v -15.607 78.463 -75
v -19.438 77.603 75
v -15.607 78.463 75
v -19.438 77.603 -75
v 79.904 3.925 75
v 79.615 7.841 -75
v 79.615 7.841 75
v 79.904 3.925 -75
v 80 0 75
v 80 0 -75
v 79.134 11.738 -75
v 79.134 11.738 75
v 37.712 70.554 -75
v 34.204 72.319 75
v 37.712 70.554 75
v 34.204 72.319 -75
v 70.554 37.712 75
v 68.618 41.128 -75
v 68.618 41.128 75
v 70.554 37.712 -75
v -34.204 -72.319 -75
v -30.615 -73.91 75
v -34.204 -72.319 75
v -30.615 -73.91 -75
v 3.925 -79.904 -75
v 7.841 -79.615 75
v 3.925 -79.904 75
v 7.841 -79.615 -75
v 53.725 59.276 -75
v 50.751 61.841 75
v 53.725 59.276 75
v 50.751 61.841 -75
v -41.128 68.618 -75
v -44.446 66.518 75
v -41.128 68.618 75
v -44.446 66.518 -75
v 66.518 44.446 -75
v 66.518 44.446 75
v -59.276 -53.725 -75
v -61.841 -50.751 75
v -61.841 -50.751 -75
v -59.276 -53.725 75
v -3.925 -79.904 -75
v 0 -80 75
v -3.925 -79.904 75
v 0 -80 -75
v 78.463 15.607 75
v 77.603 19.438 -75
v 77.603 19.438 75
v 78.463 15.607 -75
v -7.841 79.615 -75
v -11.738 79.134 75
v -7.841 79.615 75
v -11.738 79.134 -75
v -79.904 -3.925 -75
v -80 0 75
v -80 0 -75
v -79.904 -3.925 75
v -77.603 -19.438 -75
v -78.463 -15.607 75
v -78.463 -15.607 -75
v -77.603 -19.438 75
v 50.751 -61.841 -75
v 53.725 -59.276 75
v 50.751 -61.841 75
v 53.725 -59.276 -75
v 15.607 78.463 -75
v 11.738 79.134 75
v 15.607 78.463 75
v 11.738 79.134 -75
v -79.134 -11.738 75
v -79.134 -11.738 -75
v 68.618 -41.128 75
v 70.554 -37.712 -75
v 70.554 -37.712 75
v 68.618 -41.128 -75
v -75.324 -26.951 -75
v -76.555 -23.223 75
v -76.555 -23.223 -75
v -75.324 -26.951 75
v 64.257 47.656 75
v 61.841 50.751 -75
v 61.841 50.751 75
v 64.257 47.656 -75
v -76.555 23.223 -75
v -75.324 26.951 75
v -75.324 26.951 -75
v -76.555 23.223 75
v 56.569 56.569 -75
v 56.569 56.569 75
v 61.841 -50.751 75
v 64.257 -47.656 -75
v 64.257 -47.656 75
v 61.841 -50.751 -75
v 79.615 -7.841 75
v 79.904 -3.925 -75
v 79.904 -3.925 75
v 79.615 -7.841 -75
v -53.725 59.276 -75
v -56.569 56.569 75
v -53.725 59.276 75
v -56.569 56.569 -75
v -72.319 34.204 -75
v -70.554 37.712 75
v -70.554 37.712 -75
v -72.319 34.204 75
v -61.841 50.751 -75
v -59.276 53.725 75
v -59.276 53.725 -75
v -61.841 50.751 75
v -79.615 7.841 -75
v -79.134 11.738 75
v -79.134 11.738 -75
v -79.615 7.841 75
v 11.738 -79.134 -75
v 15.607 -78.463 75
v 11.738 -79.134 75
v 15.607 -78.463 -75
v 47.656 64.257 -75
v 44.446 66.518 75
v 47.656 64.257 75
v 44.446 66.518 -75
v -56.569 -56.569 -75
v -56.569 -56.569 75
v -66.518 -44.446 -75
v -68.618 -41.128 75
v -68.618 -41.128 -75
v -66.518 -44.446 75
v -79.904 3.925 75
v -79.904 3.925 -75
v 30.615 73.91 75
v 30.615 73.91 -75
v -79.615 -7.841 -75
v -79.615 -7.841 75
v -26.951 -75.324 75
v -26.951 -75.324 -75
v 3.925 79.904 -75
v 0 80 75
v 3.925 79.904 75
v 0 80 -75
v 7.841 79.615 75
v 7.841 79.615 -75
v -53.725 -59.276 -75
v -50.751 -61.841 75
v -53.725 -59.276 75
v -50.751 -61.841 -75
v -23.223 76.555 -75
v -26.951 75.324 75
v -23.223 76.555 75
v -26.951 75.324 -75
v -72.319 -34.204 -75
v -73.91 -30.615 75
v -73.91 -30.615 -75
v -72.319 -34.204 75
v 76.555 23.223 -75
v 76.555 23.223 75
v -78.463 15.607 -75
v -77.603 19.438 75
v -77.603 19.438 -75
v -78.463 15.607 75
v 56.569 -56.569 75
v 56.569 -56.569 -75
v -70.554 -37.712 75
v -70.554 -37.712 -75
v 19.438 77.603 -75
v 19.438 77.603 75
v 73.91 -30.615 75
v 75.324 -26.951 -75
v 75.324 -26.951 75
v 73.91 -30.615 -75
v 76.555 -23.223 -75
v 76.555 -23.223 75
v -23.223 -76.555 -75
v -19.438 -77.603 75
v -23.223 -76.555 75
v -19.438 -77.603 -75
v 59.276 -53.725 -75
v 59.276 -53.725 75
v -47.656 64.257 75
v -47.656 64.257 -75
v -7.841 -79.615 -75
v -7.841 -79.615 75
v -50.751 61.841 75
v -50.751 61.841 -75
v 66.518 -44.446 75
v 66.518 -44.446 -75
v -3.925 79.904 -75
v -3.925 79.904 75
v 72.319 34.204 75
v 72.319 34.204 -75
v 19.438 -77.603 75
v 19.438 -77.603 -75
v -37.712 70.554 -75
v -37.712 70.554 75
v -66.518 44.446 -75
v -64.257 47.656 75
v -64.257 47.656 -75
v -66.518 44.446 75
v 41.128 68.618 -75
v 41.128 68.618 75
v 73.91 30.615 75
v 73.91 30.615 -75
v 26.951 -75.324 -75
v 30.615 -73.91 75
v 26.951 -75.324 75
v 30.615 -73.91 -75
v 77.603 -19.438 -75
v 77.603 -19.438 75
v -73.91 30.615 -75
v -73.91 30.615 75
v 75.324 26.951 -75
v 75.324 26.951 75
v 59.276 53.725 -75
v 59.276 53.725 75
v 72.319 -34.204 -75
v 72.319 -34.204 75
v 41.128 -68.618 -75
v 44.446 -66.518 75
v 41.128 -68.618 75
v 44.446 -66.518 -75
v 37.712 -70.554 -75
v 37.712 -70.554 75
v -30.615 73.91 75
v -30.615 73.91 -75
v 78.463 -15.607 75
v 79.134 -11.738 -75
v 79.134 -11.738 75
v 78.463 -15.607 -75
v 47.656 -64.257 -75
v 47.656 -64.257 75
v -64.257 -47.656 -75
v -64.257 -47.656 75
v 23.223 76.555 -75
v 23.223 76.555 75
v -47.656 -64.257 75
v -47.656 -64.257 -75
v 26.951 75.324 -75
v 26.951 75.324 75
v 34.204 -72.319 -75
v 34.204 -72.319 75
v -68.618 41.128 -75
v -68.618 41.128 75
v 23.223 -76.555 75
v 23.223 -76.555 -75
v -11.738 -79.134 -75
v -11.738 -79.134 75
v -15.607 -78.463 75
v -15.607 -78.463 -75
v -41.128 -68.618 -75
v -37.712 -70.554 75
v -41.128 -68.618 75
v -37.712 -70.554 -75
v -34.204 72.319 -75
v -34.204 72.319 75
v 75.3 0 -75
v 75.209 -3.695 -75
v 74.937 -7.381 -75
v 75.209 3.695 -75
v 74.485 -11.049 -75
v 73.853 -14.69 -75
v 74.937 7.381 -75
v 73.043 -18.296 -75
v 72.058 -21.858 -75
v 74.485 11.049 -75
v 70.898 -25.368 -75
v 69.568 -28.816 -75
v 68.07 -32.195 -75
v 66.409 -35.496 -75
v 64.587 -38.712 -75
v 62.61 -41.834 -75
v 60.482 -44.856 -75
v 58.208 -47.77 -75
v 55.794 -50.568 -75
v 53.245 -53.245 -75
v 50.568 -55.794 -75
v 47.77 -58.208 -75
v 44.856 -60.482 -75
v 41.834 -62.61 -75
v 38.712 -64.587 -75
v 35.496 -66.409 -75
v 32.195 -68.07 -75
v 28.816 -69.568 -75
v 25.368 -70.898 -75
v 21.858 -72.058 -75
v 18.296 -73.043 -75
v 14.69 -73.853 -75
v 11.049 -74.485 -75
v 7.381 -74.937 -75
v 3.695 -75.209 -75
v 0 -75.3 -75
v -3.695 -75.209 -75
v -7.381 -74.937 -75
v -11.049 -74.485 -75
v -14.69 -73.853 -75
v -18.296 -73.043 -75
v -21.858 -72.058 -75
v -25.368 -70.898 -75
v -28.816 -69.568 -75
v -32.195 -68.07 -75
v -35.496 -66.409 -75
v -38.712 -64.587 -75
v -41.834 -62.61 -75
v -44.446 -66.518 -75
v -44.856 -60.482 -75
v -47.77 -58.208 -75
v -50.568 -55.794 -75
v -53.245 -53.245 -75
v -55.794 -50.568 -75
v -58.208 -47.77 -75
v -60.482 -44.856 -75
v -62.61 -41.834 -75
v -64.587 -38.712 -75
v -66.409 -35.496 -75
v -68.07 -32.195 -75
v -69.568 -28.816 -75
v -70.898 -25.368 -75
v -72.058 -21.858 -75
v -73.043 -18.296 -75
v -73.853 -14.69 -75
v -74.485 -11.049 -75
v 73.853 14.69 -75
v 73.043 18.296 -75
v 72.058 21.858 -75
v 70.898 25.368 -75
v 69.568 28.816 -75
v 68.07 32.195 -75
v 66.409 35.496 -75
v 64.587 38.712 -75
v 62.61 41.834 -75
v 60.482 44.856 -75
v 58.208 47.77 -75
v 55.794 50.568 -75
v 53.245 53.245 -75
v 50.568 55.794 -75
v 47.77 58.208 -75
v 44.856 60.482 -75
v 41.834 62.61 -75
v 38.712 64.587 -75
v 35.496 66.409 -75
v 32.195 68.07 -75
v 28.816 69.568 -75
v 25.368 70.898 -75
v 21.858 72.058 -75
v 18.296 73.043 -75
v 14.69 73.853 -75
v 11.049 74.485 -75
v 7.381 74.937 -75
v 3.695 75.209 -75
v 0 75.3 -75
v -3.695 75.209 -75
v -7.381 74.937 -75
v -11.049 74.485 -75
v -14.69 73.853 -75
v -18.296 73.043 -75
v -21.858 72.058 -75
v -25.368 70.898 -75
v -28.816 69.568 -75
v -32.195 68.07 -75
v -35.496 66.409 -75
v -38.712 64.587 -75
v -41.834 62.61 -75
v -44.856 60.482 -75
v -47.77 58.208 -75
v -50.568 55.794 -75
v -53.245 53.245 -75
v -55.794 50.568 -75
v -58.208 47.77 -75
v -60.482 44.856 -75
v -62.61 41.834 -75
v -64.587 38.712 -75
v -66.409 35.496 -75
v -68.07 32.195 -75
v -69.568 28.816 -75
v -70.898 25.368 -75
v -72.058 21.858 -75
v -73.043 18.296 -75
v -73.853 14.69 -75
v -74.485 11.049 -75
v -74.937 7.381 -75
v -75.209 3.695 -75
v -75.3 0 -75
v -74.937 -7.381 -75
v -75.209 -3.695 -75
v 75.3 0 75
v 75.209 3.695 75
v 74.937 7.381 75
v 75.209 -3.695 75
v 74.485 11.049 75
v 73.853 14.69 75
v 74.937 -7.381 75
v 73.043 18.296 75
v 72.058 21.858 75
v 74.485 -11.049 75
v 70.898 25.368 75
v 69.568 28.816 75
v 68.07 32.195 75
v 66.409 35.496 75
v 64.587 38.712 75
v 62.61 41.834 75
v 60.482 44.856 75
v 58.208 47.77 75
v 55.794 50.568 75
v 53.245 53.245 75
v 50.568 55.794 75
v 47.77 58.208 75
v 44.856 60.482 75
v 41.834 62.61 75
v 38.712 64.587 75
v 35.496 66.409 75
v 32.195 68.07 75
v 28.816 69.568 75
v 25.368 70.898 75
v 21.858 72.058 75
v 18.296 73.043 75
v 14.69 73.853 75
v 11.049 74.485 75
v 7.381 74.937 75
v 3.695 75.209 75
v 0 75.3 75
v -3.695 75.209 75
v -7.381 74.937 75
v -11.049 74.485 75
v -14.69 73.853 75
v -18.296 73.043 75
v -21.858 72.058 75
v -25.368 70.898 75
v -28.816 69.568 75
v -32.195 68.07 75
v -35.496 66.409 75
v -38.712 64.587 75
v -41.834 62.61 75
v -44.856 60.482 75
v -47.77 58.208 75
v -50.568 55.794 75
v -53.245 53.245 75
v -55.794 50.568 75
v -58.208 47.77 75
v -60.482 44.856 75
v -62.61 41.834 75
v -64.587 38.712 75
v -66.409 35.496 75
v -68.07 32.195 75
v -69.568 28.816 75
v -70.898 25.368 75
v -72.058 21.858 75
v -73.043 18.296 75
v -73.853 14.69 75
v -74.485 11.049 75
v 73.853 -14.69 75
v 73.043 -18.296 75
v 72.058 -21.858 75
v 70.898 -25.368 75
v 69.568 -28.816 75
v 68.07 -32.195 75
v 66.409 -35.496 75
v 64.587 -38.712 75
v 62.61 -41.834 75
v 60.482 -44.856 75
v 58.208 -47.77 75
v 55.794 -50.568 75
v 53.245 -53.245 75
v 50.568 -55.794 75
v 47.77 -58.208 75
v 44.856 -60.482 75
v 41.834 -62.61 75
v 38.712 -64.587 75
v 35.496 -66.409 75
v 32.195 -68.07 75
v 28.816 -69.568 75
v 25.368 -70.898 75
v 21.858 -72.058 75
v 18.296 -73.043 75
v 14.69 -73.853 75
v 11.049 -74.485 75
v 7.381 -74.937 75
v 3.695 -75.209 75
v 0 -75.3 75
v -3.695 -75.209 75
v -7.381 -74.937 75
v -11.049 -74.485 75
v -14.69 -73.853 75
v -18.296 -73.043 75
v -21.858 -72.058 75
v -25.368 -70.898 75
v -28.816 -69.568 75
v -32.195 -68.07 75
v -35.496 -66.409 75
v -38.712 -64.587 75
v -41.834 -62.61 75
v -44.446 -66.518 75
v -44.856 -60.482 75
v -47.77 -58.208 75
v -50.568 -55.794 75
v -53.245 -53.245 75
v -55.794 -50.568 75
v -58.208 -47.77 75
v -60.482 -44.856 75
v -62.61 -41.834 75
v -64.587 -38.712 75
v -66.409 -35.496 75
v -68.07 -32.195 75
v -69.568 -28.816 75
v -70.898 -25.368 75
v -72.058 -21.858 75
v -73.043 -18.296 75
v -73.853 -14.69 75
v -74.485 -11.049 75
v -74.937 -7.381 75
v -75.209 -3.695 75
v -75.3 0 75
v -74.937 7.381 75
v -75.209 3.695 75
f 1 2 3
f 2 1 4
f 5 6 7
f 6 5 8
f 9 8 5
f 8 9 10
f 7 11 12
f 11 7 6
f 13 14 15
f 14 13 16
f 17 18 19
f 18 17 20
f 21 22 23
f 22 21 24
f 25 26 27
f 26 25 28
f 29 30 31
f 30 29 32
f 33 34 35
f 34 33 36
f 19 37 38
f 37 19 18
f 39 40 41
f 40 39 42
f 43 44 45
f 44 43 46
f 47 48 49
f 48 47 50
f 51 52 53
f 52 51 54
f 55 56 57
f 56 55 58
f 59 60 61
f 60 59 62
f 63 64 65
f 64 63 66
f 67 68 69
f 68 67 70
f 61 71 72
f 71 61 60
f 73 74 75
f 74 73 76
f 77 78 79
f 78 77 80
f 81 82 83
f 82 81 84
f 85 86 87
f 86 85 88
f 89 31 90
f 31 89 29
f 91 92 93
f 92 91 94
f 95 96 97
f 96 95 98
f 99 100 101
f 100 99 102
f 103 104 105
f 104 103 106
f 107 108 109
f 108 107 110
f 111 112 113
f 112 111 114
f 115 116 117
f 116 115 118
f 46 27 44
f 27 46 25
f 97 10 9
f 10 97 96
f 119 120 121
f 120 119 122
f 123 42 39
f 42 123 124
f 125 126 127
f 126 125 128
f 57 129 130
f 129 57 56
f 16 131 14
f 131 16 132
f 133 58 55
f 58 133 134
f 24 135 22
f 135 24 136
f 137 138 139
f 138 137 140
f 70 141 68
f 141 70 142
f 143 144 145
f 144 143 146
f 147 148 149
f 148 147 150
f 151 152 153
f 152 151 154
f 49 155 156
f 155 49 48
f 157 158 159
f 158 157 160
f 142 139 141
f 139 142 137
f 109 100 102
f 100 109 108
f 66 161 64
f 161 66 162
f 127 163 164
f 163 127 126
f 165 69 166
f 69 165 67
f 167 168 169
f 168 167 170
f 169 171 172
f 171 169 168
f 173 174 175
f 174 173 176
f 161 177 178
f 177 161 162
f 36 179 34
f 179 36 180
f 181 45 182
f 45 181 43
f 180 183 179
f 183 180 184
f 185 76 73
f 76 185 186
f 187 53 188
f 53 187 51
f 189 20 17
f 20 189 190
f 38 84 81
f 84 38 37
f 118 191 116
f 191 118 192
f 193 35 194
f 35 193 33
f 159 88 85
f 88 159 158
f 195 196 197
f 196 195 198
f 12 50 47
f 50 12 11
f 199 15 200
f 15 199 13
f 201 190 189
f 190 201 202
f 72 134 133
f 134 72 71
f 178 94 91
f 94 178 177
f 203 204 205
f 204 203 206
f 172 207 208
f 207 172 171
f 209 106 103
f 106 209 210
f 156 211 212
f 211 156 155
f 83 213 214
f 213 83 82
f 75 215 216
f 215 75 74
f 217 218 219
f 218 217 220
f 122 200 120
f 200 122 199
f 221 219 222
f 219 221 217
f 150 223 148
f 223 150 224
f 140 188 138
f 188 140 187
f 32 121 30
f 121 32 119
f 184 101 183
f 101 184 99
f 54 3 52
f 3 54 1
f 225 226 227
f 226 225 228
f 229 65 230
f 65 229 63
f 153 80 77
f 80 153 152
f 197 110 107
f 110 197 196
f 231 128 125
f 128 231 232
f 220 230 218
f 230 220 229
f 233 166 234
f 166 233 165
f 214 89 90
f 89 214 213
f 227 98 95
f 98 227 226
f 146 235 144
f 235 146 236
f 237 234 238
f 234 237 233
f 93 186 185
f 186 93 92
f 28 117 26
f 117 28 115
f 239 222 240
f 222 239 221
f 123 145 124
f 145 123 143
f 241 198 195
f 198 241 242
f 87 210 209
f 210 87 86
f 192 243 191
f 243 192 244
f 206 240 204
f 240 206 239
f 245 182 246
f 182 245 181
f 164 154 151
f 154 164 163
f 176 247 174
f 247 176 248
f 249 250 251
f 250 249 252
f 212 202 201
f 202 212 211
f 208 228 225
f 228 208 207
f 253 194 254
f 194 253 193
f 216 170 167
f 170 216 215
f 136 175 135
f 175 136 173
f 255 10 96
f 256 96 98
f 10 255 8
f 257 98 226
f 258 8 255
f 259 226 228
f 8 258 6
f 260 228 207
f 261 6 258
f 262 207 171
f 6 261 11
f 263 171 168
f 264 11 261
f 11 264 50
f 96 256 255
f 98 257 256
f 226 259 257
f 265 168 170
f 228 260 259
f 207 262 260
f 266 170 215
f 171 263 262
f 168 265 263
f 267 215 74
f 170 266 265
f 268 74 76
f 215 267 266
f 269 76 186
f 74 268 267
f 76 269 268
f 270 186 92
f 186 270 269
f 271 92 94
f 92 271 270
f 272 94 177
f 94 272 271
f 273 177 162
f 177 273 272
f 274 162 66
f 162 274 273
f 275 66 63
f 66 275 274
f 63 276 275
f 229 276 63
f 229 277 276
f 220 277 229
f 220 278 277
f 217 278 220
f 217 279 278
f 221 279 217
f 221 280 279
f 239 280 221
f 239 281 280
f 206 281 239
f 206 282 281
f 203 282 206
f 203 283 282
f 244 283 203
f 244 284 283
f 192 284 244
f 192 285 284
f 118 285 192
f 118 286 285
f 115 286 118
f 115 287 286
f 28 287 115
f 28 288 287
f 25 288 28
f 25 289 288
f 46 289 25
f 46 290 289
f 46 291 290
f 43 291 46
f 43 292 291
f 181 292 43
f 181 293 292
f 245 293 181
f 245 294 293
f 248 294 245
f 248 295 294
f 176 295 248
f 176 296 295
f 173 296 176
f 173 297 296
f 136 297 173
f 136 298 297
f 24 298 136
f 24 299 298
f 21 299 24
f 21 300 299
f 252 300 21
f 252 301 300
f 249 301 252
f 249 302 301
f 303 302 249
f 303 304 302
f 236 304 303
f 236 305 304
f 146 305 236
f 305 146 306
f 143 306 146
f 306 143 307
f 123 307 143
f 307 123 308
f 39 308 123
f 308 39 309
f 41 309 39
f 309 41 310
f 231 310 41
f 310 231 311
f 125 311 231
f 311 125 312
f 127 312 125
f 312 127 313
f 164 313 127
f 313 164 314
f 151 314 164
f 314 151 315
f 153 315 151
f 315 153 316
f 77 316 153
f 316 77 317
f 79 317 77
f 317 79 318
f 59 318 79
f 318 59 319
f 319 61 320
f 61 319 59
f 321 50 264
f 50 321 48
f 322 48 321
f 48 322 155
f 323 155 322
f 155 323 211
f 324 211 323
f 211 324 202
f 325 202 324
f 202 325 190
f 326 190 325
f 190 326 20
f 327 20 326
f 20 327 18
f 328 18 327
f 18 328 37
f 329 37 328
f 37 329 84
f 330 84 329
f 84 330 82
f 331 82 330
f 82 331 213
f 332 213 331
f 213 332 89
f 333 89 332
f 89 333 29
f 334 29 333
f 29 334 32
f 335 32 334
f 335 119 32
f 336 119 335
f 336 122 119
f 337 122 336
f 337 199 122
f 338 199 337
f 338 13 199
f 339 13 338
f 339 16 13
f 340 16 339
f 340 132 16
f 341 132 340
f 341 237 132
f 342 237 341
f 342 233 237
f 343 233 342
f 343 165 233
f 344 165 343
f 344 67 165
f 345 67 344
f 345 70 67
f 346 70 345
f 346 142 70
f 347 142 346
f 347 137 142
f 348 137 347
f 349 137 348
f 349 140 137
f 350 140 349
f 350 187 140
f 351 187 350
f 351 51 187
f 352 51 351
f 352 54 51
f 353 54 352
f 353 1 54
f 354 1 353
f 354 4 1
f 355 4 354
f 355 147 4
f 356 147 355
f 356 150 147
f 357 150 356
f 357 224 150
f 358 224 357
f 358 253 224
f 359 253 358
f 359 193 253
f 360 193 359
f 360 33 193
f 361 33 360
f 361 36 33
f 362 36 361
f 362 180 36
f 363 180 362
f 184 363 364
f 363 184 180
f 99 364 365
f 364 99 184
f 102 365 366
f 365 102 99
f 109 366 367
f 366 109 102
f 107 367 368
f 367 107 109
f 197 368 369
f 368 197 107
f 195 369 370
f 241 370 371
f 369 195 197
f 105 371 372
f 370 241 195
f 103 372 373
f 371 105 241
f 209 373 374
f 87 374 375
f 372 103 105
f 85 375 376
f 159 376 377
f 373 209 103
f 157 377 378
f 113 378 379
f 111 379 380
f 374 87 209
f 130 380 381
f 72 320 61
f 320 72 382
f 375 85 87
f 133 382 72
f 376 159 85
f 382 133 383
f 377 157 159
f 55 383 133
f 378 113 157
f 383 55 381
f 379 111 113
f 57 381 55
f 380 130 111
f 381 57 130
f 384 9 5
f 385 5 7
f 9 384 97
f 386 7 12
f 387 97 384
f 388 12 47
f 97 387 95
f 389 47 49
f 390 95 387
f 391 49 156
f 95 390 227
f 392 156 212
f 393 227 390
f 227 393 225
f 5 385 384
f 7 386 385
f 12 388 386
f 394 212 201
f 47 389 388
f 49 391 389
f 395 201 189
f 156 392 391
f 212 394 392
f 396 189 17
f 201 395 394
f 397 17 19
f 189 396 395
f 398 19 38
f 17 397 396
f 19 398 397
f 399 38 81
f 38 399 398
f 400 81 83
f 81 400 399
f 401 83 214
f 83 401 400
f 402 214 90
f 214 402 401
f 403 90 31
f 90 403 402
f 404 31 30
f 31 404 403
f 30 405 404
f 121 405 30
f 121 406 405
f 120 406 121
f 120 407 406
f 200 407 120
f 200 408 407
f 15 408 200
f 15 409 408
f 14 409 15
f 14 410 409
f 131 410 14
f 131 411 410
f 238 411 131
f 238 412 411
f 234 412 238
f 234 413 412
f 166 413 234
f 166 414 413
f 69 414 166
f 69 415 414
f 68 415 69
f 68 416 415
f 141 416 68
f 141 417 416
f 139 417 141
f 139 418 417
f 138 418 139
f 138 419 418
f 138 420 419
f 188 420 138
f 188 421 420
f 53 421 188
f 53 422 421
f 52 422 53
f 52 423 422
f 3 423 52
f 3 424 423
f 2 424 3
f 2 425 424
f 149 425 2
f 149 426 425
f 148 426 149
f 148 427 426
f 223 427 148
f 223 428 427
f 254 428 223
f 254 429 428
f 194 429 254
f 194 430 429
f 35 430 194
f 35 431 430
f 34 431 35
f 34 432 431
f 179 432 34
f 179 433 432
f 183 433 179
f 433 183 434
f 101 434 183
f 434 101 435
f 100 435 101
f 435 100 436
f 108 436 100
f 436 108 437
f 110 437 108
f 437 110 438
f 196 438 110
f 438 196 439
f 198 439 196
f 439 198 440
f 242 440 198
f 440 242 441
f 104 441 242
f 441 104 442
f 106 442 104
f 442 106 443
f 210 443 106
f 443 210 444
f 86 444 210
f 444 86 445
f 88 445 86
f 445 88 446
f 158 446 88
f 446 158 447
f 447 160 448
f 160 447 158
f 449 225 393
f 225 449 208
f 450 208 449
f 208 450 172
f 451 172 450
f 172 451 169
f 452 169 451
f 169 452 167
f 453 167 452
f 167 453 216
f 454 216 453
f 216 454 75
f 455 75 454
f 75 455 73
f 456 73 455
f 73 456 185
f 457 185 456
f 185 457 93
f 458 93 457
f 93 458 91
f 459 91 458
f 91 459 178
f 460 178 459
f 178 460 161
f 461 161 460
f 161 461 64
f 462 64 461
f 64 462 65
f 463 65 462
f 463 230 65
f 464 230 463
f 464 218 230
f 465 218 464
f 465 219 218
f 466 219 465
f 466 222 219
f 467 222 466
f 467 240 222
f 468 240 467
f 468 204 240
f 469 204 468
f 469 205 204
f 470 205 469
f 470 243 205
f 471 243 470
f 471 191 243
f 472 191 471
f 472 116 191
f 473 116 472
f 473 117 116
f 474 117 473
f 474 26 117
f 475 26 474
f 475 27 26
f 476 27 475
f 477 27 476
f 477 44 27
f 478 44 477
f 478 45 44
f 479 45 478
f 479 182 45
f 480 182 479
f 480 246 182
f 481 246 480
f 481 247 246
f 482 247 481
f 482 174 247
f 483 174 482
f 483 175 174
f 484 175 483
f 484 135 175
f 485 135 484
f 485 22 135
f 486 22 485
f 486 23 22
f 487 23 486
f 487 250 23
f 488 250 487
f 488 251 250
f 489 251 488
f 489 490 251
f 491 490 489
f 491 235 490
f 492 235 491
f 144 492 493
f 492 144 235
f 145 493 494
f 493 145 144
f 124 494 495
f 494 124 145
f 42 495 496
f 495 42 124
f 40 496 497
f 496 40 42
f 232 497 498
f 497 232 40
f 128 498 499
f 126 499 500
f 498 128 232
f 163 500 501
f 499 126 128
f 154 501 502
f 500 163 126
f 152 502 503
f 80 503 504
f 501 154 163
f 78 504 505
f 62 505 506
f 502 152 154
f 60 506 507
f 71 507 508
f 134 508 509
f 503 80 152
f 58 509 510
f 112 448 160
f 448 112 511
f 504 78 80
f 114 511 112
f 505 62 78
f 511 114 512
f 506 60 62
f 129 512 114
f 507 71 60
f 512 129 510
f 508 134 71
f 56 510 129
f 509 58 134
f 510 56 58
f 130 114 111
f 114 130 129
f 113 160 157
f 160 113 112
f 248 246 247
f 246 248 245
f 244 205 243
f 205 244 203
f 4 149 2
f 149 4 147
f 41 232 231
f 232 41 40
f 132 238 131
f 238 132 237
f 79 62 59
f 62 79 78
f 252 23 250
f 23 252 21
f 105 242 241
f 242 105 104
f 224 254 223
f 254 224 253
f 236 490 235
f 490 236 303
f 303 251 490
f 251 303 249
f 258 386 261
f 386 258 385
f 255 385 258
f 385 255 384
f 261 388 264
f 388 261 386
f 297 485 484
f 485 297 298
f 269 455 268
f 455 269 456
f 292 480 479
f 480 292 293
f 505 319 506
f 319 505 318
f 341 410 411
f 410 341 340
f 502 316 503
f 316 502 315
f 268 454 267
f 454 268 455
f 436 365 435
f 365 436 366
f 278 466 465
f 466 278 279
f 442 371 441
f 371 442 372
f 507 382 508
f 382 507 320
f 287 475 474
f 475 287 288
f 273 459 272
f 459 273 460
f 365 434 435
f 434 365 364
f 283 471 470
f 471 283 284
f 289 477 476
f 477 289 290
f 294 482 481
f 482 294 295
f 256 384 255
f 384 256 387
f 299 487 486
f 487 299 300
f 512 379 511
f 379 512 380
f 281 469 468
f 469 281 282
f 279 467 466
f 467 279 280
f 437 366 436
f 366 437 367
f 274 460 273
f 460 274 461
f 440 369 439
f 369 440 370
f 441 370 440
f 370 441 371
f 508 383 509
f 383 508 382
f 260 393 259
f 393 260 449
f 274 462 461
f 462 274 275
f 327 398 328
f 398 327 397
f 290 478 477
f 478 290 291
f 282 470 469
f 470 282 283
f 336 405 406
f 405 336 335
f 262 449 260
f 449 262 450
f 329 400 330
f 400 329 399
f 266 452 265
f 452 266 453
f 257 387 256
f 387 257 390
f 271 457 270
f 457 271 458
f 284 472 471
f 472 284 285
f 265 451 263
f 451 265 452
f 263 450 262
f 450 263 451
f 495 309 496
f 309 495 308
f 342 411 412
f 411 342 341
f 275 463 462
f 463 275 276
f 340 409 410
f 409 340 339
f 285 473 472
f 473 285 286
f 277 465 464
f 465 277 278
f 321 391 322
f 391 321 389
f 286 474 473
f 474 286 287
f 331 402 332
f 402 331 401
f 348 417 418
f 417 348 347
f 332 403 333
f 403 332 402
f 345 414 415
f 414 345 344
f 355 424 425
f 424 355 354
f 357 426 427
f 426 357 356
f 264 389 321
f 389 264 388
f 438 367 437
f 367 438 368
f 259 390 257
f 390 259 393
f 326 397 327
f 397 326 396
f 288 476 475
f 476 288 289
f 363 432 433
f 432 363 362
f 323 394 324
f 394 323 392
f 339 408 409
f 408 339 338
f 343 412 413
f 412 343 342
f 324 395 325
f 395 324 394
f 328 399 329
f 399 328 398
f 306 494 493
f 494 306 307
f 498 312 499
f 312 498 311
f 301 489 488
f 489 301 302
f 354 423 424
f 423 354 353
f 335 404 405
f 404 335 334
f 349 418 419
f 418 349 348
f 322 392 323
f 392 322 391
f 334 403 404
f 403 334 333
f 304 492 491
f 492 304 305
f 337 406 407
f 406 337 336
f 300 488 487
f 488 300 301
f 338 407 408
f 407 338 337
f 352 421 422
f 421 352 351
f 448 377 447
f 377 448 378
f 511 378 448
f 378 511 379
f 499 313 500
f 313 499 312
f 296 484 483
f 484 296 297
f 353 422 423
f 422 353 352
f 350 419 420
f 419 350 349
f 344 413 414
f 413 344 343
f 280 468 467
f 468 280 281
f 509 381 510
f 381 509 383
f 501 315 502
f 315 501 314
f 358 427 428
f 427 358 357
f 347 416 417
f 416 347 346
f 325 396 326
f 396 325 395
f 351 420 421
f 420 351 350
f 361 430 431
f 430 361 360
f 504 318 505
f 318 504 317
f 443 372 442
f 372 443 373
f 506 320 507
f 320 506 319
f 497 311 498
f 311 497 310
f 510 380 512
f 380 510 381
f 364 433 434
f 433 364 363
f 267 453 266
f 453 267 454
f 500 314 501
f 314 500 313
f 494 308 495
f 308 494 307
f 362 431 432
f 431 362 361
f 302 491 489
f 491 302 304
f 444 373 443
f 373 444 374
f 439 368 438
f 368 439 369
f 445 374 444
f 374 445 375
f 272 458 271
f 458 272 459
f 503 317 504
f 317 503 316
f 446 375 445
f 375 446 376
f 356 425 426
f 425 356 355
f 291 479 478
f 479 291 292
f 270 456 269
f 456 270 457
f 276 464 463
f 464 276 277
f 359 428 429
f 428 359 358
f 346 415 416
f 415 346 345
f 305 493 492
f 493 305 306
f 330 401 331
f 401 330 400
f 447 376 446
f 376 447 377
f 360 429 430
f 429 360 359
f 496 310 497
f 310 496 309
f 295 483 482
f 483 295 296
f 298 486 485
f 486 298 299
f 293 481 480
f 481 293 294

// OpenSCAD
$fn=128;

module ht_pipe(od=160, length=150, wall=4.7) {
    difference() {
        cylinder(h=length, d=od, center=true);
        cylinder(h=length+2, d=od-2*wall, center=true);
    }
}

ht_pipe(od=160, length=150, wall=4.7);
